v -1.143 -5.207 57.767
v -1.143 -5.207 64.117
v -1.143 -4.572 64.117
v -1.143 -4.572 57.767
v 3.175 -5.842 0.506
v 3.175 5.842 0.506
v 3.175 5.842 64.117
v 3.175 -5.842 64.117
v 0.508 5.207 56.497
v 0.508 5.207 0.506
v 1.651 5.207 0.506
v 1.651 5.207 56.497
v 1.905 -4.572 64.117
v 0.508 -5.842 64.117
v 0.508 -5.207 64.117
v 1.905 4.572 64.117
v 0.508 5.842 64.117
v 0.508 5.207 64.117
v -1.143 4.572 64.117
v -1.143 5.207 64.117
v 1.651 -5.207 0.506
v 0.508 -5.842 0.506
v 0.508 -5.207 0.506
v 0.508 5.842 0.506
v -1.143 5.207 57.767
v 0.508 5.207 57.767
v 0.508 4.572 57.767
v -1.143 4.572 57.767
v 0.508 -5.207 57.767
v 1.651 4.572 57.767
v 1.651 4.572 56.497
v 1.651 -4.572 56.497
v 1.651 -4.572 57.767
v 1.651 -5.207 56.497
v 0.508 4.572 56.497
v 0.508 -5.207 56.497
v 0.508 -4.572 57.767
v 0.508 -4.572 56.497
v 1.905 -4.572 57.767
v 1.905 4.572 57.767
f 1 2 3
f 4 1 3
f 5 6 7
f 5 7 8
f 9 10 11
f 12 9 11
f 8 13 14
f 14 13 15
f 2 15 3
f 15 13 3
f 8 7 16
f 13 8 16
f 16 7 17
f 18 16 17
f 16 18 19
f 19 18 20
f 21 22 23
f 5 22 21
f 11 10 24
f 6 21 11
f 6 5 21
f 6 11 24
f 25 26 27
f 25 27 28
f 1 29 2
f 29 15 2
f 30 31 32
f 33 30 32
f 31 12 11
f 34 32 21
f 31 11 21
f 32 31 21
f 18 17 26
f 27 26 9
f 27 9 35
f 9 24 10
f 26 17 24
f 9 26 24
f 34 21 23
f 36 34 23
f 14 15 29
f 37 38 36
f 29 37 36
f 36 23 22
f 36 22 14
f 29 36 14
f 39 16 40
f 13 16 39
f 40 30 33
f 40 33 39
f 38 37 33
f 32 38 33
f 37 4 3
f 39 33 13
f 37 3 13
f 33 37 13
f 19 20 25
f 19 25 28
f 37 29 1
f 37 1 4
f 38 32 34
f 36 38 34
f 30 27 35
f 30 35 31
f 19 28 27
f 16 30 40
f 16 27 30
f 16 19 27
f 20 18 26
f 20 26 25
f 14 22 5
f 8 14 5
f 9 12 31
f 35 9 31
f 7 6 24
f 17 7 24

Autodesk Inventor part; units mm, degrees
ref_plane "YZ Plane" through (0, 0, 0) normal (1, 0, 0) x (0, 1, 0)
sketch "Sketch1" plane through (0, 0, 0) normal (0, 0, 1) x (1, 0, 0)
  arc A0 (-8.0491, 3.1697) -> (-8.0491, -3.1803) centre (-17.5665, -0.0053) ccw projected
  line L0 (-1.651, -3.1803) -> (-8.0491, -3.1803) projected
  line L1 (-1.651, -5.461) -> (-1.651, -3.1803) projected
  line L2 (0, -5.461) -> (-1.651, -5.461) projected
  line L3 (0, -5.461) -> (0, -6.35) projected
  line L4 (3.175, -6.35) -> (0, -6.35) projected
  line L5 (3.175, 6.35) -> (3.175, -6.35) projected
  line L6 (3.175, 6.35) -> (0, 6.35) projected
  line L7 (0, 6.35) -> (0, 5.461) projected
  line L8 (-1.651, 5.461) -> (0, 5.461) projected
  line L9 (-1.651, 3.1697) -> (-1.651, 5.461) projected
  line L10 (-1.651, 3.1697) -> (-8.0491, 3.1697) projected
  line L11 (3.175, 5.842) -> (0.508, 5.842)
  line L12 (0.508, 5.842) -> (0.508, -5.842)
  line L13 (0.508, -5.842) -> (3.175, -5.842)
  line L14 (3.175, -5.842) -> (3.175, 5.842)
  line L15 (0.508, 5.207) -> (1.651, 5.207)
  line L16 (1.651, 5.207) -> (1.651, -5.207)
  line L17 (1.651, -5.207) -> (0.508, -5.207)
  line L18 (0.508, -5.207) -> (0.508, 5.207)
  point P0 (0, 0)
  dimension "d0" = 0.508
  dimension "d1" = 0.508
  dimension "d2" = 0.508
  dimension "d3" = 0.635
  dimension "d4" = 0.635
  dimension "d5" = 1.524
ref_plane "Work Plane1" through (0, -6.35, 57.7672) normal (0, 0, -1) x (0, 1, 0)
extrude "Extrusion1" add sketch "Sketch1" along normal up to surface (57.7672 mm away) contours L5 L13 L12 L17 L16 L15 L11
ref_plane "Work Plane2" through (2.413, 0, 64.1172) normal (0, 0, -1) x (-1, 0, 0)
sketch "Sketch2" plane through (2.413, 0, 64.1172) normal (0, 0, -1) x (-1, 0, 0)
  line L0 (-0.762, -5.842) -> (-0.762, 5.842) projected
  line L1 (-0.762, 5.08) -> (3.556, 5.08)
  line L2 (3.556, 5.08) -> (3.556, 4.572)
  line L3 (3.556, 4.572) -> (-0.762, 4.572)
  line L4 (-0.762, 4.572) -> (-0.762, 5.08)
  line L5 (-0.762, -5.08) -> (3.556, -5.08)
  line L6 (3.556, -5.08) -> (3.556, -4.572)
  line L7 (3.556, -4.572) -> (-0.762, -4.572)
  line L8 (-0.762, -4.572) -> (-0.762, -5.08)
  line L9 (1.905, -5.207) -> (0.762, -5.207) projected
  line L10 (0.762, 5.207) -> (1.905, 5.207) projected
  line L11 (-0.762, 5.08) -> (0.508, 5.08)
  line L12 (0.508, 5.08) -> (0.508, -5.08)
  line L13 (0.508, -5.08) -> (-0.762, -5.08)
  line L14 (-0.762, -5.08) -> (-0.762, 5.08)
  point P0 (2.413, 0)
  dimension "d8" = 0.508
  dimension "d9" = 4.318
  dimension "d10" = 4.318
  dimension "d11" = 0.508
  dimension "d12" = 0.127
  dimension "d13" = 0.127
extrude "Extrusion2" add sketch "Sketch2" along normal up to surface (6.35 mm away)
sketch "Sketch3" plane through (1.651, -5.207, 0) normal (-1, 0, 0) x (0, 0, 1)
  line L0 (0, 10.414) -> (57.7672, 10.414) projected
  line L1 (57.7672, 10.414) -> (56.4972, 10.414)
  line L2 (56.4972, 10.414) -> (56.4972, 9.779)
  line L3 (56.4972, 9.779) -> (57.7672, 9.779)
  line L4 (57.7672, 9.779) -> (57.7672, 10.414)
  line L5 (57.7672, -0.635) -> (57.7672, 0.127) projected
  line L6 (57.7672, 0) -> (56.4972, 0)
  line L7 (56.4972, 0.635) -> (57.7672, 0.635)
  line L8 (57.7672, 0.635) -> (57.7672, 0)
  line L9 (64.1172, 9.779) -> (57.7672, 9.779) projected
  line L10 (56.4972, 0.635) -> (56.4972, 0)
  point P0 (0, 5.207)
  dimension "d16" = 1.27
extrude "Extrusion3" add sketch "Sketch3" along normal up to surface (1.143 mm away)
sketch "Sketch4" plane through (3.175, -5.842, 0) normal (1, 0, 0) x (0, 0, -1)
  line L0 (0, 11.684) -> (-57.7672, 11.684) projected
  line L1 (0.0018, 0) -> (-0.5062, 0)
  line L2 (-0.5062, 0) -> (-0.5062, 11.684)
  line L3 (-0.5062, 11.684) -> (0.0018, 11.684)
  line L4 (0.0018, 11.684) -> (0.0018, 0)
  point P0 (0, 5.842)
  dimension "d19" = 0.508
extrude "Extrusion4" cut sketch "Sketch4" against normal blind 25.4
sketch "Sketch5" plane through (3.175, -5.08, 64.1172) normal (1, 0, 0) x (0, 0, -1)
  line L0 (63.611, -0.762) -> (63.611, 10.922) projected
  line L1 (63.611, 10.922) -> (6.35, 10.922) projected
  line L2 (6.35, 10.16) -> (6.35, 10.922) projected
  line L3 (0, 10.16) -> (6.35, 10.16) projected
  line L4 (0, 10.16) -> (0, 0) projected
  line L5 (0, 0) -> (6.35, 0) projected
  line L6 (6.35, -0.762) -> (6.35, 0) projected
  line L7 (63.611, -0.762) -> (6.35, -0.762) projected
  line L8 (6.35, 10.16) -> (6.35, 10.922) projected
  line L9 (0, 9.652) -> (0, 10.16) projected
  line L10 (6.35, 10.922) -> (0, 10.922)
  line L11 (0, 10.922) -> (0, 10.16)
  line L12 (0, 10.16) -> (6.35, 10.16)
  line L13 (6.35, 10.16) -> (6.35, 10.922)
  line L14 (0, 10.16) -> (0, 0) projected
  line L15 (6.35, -0.762) -> (6.35, 0) projected
  line L16 (0, 0) -> (6.35, 0)
  line L17 (6.35, 0) -> (6.35, -0.762)
  line L18 (6.35, -0.762) -> (0, -0.762)
  line L19 (0, -0.762) -> (0, 0)
  point P0 (64.1172, 5.08)
extrude "Extrusion5" add sketch "Sketch5" against normal up to surface (4.318 mm away) contours L18 L19 L5 L6 | L2 L3 L11 L10
sketch "Sketch6" plane through (2.413, 0, 64.1172) normal (0, 0, 1) x (1, 0, 0)
  line L0 (-0.508, -4.572) -> (-0.508, 4.572) projected
  line L1 (-3.556, -4.572) -> (-0.508, -4.572) projected
  line L2 (-3.556, -4.572) -> (-3.556, -5.842) projected
  line L3 (0.762, -5.842) -> (-3.556, -5.842) projected
  line L4 (0.762, 5.842) -> (0.762, -5.842) projected
  line L5 (0.762, 5.842) -> (-3.556, 5.842) projected
  line L6 (-3.556, 4.572) -> (-3.556, 5.842) projected
  line L7 (-0.508, 4.572) -> (-3.556, 4.572) projected
  line L8 (0.762, -5.842) -> (-3.556, -5.842) projected
  line L9 (-3.556, -5.842) -> (-1.905, -5.842)
  line L10 (-1.905, -5.842) -> (-1.905, -5.207)
  line L11 (-1.905, -5.207) -> (-3.556, -5.207)
  line L12 (-3.556, -5.207) -> (-3.556, -5.842)
  line L13 (-3.556, 5.842) -> (-1.905, 5.842)
  line L14 (-1.905, 5.842) -> (-1.905, 5.207)
  line L15 (-1.905, 5.207) -> (-3.556, 5.207)
  line L16 (-3.556, 5.207) -> (-3.556, 5.842)
  line L17 (-1.905, 5.842) -> (-1.905, 5.207) projected
  line L18 (-1.905, 4.572) -> (-1.905, 5.207) projected
  line L19 (-1.905, 5.842) -> (-1.905, 4.572) projected
  line L20 (-1.905, -5.207) -> (-1.905, -5.842) projected
  line L21 (-1.905, -4.572) -> (-1.905, -5.842) projected
  line L22 (-1.905, -5.207) -> (-1.905, -4.572) projected
  line L23 (-0.762, -5.207) -> (-1.905, -5.207) projected
  line L24 (-1.905, -5.207) -> (-0.762, -5.207) projected
  line L25 (-1.905, 5.207) -> (-0.762, 5.207) projected
  line L26 (-0.762, 5.207) -> (-1.905, 5.207) projected
  point P0 (-2.413, 0)
extrude "Extrusion6" cut sketch "Sketch6" against normal blind 25.4 contours L10 L3 L2 L11 | L15 L6 L5 L14
properties part number "Wire Cover Strengthened"
